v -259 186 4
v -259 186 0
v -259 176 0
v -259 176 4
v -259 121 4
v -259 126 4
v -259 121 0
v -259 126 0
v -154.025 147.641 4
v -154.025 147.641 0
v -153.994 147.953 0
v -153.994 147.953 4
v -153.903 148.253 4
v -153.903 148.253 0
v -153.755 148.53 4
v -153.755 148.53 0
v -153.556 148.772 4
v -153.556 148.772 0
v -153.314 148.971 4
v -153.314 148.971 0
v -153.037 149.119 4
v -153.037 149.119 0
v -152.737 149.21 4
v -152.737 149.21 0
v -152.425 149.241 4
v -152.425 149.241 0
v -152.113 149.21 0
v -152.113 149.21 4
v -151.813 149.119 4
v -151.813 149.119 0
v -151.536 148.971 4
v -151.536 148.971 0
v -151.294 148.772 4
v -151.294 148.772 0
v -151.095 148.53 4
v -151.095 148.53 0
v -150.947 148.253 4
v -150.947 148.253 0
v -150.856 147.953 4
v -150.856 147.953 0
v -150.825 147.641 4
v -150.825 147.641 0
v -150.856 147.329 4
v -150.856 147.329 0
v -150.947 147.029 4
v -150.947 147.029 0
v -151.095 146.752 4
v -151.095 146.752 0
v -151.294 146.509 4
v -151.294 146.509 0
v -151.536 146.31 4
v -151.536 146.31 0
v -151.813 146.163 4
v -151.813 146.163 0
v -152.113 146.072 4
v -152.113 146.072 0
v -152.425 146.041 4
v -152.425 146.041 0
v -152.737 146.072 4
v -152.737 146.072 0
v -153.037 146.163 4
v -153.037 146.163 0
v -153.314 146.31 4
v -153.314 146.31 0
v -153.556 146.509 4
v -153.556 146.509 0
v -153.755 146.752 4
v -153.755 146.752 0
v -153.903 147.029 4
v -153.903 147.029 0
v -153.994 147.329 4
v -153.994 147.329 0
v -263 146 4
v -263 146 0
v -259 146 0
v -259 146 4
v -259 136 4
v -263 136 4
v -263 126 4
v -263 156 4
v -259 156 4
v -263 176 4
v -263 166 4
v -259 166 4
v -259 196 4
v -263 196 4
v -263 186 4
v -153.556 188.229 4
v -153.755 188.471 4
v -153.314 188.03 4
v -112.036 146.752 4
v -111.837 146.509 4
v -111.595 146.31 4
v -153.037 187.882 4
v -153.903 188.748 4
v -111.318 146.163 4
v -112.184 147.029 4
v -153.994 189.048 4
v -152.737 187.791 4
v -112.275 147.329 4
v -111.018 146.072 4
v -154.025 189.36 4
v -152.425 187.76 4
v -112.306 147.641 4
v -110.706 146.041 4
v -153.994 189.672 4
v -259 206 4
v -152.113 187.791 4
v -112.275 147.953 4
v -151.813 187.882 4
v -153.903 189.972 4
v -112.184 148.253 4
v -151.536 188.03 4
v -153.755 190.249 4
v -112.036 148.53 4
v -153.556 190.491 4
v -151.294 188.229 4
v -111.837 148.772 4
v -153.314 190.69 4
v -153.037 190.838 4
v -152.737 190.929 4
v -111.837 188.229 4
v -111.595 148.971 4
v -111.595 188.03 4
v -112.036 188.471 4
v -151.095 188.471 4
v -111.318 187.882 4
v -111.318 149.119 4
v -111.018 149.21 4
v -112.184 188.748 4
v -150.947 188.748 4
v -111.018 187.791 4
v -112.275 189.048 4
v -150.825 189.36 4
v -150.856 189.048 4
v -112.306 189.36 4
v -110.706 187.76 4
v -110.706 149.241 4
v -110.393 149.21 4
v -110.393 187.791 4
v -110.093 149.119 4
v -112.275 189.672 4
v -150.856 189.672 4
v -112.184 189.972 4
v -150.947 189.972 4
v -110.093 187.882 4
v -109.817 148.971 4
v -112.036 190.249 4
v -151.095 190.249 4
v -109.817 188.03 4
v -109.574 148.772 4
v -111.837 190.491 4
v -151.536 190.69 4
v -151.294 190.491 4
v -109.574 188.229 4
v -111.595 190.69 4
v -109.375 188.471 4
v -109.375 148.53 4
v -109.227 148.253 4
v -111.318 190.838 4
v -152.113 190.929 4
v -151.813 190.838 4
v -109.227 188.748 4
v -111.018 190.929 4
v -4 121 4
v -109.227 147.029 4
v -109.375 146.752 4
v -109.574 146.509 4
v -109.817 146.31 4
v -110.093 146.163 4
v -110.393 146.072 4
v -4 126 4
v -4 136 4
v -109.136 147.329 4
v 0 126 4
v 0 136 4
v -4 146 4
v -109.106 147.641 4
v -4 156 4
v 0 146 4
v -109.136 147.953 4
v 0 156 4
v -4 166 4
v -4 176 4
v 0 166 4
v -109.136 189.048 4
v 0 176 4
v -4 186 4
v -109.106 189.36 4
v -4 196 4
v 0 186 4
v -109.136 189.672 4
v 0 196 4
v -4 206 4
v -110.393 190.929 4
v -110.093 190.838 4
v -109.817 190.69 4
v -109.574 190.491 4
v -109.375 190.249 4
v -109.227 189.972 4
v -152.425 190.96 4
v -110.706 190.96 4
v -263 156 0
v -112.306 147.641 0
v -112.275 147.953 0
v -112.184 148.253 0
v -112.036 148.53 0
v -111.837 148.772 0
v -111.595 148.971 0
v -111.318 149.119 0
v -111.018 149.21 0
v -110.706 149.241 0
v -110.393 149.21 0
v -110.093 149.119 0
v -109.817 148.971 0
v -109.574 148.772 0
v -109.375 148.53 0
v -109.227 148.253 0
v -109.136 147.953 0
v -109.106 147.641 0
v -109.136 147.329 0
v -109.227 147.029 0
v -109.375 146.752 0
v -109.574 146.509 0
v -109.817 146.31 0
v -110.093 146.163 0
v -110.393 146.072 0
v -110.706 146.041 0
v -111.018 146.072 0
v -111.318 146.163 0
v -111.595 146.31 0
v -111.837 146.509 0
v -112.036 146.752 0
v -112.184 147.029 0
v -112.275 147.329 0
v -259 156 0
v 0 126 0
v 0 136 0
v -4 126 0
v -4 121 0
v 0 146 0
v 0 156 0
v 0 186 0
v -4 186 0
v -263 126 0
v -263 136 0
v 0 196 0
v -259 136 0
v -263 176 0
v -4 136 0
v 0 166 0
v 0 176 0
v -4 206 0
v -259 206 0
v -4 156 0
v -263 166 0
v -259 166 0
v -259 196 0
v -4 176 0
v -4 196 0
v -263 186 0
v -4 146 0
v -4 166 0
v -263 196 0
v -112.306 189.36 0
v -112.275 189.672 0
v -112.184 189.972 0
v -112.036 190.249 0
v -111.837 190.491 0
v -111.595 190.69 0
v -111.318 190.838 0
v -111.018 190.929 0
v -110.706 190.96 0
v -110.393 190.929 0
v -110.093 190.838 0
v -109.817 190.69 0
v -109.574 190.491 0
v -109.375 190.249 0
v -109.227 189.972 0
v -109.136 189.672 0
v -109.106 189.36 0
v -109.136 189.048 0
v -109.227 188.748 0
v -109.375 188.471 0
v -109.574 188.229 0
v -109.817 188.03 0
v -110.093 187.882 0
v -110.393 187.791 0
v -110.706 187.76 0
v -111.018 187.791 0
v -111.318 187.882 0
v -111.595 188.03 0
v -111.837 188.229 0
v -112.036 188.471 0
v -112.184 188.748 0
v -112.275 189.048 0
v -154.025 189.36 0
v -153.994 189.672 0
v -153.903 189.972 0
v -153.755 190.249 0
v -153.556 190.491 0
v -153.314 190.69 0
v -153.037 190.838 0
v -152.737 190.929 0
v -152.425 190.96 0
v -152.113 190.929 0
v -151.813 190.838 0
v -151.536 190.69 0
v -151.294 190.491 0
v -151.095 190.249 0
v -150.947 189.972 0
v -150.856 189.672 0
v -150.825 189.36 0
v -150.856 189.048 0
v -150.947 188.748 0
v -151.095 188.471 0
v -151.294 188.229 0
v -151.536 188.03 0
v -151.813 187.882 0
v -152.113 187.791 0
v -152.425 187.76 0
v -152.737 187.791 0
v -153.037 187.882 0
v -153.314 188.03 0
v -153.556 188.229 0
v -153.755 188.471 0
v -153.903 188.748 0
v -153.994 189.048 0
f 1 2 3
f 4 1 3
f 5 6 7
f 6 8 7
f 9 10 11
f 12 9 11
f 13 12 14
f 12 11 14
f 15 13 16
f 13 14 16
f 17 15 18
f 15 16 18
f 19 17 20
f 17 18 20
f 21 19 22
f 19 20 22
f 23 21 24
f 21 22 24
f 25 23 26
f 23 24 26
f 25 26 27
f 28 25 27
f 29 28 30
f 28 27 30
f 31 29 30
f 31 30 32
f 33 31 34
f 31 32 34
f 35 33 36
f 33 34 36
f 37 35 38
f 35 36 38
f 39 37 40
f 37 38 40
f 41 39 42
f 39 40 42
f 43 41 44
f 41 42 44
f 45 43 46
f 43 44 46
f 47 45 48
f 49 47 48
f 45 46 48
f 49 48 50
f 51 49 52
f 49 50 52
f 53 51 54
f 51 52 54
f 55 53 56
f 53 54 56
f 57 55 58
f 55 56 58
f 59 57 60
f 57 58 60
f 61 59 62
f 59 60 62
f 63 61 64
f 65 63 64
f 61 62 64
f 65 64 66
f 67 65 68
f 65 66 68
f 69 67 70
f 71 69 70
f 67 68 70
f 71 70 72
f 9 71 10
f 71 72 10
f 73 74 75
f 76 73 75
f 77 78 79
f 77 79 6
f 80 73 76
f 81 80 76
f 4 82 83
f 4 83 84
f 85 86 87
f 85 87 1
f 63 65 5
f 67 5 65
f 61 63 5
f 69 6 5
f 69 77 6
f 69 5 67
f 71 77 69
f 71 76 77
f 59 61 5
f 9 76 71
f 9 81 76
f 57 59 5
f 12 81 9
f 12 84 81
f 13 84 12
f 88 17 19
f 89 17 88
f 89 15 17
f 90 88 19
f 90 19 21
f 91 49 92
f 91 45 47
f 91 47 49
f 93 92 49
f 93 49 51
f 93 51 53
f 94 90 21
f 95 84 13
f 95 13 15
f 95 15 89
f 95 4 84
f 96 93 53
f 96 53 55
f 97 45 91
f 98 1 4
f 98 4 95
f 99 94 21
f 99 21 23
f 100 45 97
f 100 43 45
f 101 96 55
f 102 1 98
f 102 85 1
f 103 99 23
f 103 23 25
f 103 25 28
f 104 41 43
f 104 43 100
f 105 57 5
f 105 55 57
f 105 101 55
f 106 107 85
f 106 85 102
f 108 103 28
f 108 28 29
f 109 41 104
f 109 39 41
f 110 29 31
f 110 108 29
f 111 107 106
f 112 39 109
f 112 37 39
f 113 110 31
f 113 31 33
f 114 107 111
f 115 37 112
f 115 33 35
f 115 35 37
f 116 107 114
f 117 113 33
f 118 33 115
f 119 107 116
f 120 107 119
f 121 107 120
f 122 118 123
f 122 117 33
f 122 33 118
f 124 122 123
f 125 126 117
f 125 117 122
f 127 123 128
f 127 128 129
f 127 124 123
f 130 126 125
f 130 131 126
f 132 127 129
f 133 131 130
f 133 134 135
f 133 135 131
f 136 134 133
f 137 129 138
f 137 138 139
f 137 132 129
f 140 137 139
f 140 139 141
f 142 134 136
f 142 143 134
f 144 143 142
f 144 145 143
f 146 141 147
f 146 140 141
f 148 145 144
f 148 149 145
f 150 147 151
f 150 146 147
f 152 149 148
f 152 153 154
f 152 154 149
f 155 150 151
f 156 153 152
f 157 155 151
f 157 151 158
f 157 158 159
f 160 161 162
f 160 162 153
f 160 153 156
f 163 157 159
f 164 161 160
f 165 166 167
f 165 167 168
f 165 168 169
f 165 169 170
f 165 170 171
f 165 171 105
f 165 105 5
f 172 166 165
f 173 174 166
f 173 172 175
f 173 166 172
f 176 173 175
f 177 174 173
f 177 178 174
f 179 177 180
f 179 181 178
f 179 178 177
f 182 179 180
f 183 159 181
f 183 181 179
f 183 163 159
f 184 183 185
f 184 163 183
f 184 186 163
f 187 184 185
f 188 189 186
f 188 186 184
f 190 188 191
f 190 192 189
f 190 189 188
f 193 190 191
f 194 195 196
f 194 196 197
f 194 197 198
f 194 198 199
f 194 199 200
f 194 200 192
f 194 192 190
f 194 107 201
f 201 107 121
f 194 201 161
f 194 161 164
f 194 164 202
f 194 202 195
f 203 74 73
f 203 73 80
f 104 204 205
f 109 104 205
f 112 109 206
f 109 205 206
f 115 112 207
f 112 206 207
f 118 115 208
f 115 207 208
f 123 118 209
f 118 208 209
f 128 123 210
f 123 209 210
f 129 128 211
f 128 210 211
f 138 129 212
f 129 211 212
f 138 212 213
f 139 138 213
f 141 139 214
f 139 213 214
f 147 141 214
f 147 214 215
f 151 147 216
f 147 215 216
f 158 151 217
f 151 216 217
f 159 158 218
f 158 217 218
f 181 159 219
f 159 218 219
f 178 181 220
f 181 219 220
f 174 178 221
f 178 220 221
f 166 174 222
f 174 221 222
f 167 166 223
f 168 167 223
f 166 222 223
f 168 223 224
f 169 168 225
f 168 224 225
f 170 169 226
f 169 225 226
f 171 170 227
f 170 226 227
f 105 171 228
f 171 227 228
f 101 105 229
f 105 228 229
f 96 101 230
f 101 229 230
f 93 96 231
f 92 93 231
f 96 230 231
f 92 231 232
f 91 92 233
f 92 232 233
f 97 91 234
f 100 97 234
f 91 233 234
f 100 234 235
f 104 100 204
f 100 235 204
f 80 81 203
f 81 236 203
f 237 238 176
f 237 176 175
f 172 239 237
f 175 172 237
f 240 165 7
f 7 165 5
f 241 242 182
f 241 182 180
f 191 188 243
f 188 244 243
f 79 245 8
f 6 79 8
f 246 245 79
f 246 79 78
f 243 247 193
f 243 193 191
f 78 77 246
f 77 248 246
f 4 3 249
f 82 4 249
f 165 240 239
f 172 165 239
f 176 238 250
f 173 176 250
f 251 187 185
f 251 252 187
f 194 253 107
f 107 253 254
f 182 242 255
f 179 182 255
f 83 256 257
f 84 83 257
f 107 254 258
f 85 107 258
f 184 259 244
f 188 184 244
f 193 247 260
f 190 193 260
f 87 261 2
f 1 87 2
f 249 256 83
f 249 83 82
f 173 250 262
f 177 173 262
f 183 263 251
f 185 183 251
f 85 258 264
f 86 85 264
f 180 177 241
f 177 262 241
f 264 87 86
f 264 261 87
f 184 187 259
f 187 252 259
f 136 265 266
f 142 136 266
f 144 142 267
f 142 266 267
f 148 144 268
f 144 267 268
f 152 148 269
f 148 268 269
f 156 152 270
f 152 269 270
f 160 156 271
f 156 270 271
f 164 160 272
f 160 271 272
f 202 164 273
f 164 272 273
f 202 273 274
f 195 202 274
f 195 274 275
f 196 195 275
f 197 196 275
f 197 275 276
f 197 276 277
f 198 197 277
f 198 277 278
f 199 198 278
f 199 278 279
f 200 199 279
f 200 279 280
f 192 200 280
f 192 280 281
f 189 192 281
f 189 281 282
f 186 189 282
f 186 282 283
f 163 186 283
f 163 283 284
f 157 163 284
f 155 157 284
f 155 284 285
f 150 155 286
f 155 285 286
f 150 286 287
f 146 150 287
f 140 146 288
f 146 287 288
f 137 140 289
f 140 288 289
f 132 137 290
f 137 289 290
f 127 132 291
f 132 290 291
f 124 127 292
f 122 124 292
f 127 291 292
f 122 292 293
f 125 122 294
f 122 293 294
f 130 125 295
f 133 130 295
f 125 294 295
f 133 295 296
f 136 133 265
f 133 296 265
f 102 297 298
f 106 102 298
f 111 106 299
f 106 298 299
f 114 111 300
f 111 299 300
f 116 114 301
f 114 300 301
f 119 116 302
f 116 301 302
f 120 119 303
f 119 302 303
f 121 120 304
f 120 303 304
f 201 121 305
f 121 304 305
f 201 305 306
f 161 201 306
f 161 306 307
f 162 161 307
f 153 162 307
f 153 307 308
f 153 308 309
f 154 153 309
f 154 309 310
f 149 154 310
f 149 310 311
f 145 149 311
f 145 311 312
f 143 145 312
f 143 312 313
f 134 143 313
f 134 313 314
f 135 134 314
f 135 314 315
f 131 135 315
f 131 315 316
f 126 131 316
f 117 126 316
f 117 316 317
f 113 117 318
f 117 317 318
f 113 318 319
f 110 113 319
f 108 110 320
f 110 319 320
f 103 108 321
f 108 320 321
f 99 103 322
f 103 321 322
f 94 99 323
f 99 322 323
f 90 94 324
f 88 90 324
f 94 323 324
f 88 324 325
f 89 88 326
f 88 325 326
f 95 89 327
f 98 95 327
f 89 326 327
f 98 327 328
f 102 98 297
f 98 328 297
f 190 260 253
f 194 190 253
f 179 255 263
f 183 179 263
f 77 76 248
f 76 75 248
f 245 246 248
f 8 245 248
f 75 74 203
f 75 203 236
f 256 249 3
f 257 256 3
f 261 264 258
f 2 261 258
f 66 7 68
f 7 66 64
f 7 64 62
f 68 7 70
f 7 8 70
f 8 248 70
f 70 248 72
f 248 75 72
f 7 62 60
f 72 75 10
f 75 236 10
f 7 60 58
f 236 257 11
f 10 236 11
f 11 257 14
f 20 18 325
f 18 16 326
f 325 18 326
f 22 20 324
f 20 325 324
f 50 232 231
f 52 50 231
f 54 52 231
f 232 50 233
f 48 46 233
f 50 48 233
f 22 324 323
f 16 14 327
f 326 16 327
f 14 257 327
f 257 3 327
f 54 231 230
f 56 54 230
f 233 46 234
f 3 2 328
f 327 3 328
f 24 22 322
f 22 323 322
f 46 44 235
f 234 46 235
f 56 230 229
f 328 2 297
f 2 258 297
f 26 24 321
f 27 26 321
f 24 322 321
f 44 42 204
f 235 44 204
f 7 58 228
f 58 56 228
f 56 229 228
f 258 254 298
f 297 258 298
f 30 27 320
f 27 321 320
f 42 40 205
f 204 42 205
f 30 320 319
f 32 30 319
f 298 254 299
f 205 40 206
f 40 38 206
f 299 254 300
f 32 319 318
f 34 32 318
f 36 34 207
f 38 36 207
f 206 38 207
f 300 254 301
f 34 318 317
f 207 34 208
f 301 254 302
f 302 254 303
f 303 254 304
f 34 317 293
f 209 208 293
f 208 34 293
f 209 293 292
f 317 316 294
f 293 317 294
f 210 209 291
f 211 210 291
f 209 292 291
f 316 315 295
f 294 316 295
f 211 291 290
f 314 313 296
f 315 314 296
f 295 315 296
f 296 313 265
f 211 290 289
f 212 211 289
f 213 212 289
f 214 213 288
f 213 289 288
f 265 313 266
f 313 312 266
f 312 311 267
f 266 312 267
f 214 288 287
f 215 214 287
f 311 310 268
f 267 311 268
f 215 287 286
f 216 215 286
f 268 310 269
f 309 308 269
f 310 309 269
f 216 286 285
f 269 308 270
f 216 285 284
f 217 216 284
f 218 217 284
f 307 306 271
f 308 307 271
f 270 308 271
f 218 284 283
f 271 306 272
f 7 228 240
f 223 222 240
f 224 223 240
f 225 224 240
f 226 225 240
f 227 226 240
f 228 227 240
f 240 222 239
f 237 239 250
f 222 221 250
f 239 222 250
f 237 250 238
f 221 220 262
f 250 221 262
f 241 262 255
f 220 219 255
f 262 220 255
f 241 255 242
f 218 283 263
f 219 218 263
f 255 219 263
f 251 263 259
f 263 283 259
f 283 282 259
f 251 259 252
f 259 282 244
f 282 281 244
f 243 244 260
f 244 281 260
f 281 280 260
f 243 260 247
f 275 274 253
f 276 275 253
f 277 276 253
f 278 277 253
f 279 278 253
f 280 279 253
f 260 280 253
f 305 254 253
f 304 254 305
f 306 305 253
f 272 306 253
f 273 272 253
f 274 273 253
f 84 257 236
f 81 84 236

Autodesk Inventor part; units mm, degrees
ref_plane "YZ Plane" through (0, 0, 0) normal (1, 0, 0) x (0, 1, 0)
ref_plane "XZ Plane" through (0, 0, 0) normal (0, 1, 0) x (-1, 0, 0)
ref_plane "XY Plane" through (0, 0, 0) normal (0, 0, 1) x (1, 0, 0)
sketch "Эскиз1" plane through (0, 0, 0) normal (0, 0, 1) x (1, 0, 0)
  line L0 (0, 16.0005) -> (-4, 16.0005) projected
  line L1 (-4, 6.0005) -> (-4, 16.0005) projected
  line L2 (-4, 6.0005) -> (0, 6.0005) projected
  line L3 (0, 16.0005) -> (0, 6.0005) projected
  line L4 (0, 36.0005) -> (-4, 36.0005) projected
  line L5 (-4, 26.0005) -> (-4, 36.0005) projected
  line L6 (-4, 26.0005) -> (0, 26.0005) projected
  line L7 (0, 36.0005) -> (0, 26.0005) projected
  line L8 (0, 56.0005) -> (-4, 56.0005) projected
  line L9 (-4, 46.0005) -> (-4, 56.0005) projected
  line L10 (-4, 46.0005) -> (0, 46.0005) projected
  line L11 (0, 56.0005) -> (0, 46.0005) projected
  line L12 (0, 196.0005) -> (-4, 196.0005) projected
  line L13 (-4, 186.0005) -> (-4, 196.0005) projected
  line L14 (-4, 186.0005) -> (0, 186.0005) projected
  line L15 (0, 196.0005) -> (0, 186.0005) projected
  line L16 (0, 176.0005) -> (-4, 176.0005) projected
  line L17 (-4, 166.0005) -> (-4, 176.0005) projected
  line L18 (-4, 166.0005) -> (0, 166.0005) projected
  line L19 (0, 176.0005) -> (0, 166.0005) projected
  line L20 (0, 156.0005) -> (-4, 156.0005) projected
  line L21 (-4, 146.0005) -> (-4, 156.0005) projected
  line L22 (-4, 146.0005) -> (0, 146.0005) projected
  line L23 (0, 156.0005) -> (0, 146.0005) projected
  line L24 (0, 116.0005) -> (-4, 116.0005) projected
  line L25 (-4, 106.0005) -> (-4, 116.0005) projected
  line L26 (-4, 106.0005) -> (0, 106.0005) projected
  line L27 (0, 116.0005) -> (0, 106.0005) projected
  line L28 (0, 136.0005) -> (-4, 136.0005) projected
  line L29 (-4, 126.0005) -> (-4, 136.0005) projected
  line L30 (-4, 126.0005) -> (0, 126.0005) projected
  line L31 (0, 136.0005) -> (0, 126.0005) projected
  line L32 (0, 96.0005) -> (-4, 96.0005) projected
  line L33 (-4, 86.0005) -> (-4, 96.0005) projected
  line L34 (-4, 86.0005) -> (0, 86.0005) projected
  line L35 (0, 96.0005) -> (0, 86.0005) projected
  line L36 (0, 76.0005) -> (-4, 76.0005) projected
  line L37 (-4, 66.0005) -> (-4, 76.0005) projected
  line L38 (-4, 66.0005) -> (0, 66.0005) projected
  line L39 (0, 76.0005) -> (0, 66.0005) projected
  line L40 (-194, 0) -> (-194, -4) projected
  line L41 (-189, -4) -> (-194, -4) projected
  line L42 (-189, -4) -> (-189, 0) projected
  line L43 (-194, 0) -> (-189, 0) projected
  line L44 (-184, 0) -> (-184, -4) projected
  line L45 (-179, -4) -> (-184, -4) projected
  line L46 (-179, -4) -> (-179, 0) projected
  line L47 (-184, 0) -> (-179, 0) projected
  line L48 (-174, 0) -> (-174, -4) projected
  line L49 (-169, -4) -> (-174, -4) projected
  line L50 (-169, -4) -> (-169, 0) projected
  line L51 (-174, 0) -> (-169, 0) projected
  line L52 (-164, 0) -> (-164, -4) projected
  line L53 (-159, -4) -> (-164, -4) projected
  line L54 (-159, -4) -> (-159, 0) projected
  line L55 (-164, 0) -> (-159, 0) projected
  line L56 (-154, 0) -> (-154, -4) projected
  line L57 (-149, -4) -> (-154, -4) projected
  line L58 (-149, -4) -> (-149, 0) projected
  line L59 (-154, 0) -> (-149, 0) projected
  line L60 (-144, 0) -> (-144, -4) projected
  line L61 (-139, -4) -> (-144, -4) projected
  line L62 (-139, -4) -> (-139, 0) projected
  line L63 (-144, 0) -> (-139, 0) projected
  line L64 (-14, 0) -> (-14, -4) projected
  line L65 (-9, -4) -> (-14, -4) projected
  line L66 (-9, -4) -> (-9, 0) projected
  line L67 (-14, 0) -> (-9, 0) projected
  line L68 (-24, 0) -> (-24, -4) projected
  line L69 (-19, -4) -> (-24, -4) projected
  line L70 (-19, -4) -> (-19, 0) projected
  line L71 (-24, 0) -> (-19, 0) projected
  line L72 (-95.712, 271.7663) -> (-95.712, 277.9752) projected
  line L73 (-34, 0) -> (-34, -4) projected
  line L74 (-29, -4) -> (-34, -4) projected
  line L75 (-29, -4) -> (-29, 0) projected
  line L76 (-34, 0) -> (-29, 0) projected
  line L77 (-44, 0) -> (-44, -4) projected
  line L78 (-39, -4) -> (-44, -4) projected
  line L79 (-39, -4) -> (-39, 0) projected
  line L80 (-44, 0) -> (-39, 0) projected
  line L81 (-54, 0) -> (-54, -4) projected
  line L82 (-49, -4) -> (-54, -4) projected
  line L83 (-49, -4) -> (-49, 0) projected
  line L84 (-54, 0) -> (-49, 0) projected
  line L85 (-64, 0) -> (-64, -4) projected
  line L86 (-59, -4) -> (-64, -4) projected
  line L87 (-59, -4) -> (-59, 0) projected
  line L88 (-64, 0) -> (-59, 0) projected
  line L89 (-74, 0) -> (-74, -4) projected
  line L90 (-69, -4) -> (-74, -4) projected
  line L91 (-69, -4) -> (-69, 0) projected
  line L92 (-74, 0) -> (-69, 0) projected
  line L93 (-84, 0) -> (-84, -4) projected
  line L94 (-79, -4) -> (-84, -4) projected
  line L95 (-79, -4) -> (-79, 0) projected
  line L96 (-84, 0) -> (-79, 0) projected
  line L97 (-94, 0) -> (-94, -4) projected
  line L98 (-89, -4) -> (-94, -4) projected
  line L99 (-89, -4) -> (-89, 0) projected
  line L100 (-94, 0) -> (-89, 0) projected
  line L101 (-104, 0) -> (-104, -4) projected
  line L102 (-99, -4) -> (-104, -4) projected
  line L103 (-99, -4) -> (-99, 0) projected
  line L104 (-104, 0) -> (-99, 0) projected
  line L105 (-114, 0) -> (-114, -4) projected
  line L106 (-109, -4) -> (-114, -4) projected
  line L107 (-109, -4) -> (-109, 0) projected
  line L108 (-114, 0) -> (-109, 0) projected
  line L109 (-134, 0) -> (-134, -4) projected
  line L110 (-129, -4) -> (-134, -4) projected
  line L111 (-129, -4) -> (-129, 0) projected
  line L112 (-134, 0) -> (-129, 0) projected
  line L113 (-124, 0) -> (-124, -4) projected
  line L114 (-119, -4) -> (-124, -4) projected
  line L115 (-119, -4) -> (-119, 0) projected
  line L116 (-124, 0) -> (-119, 0) projected
  line L117 (-263, 126.0005) -> (-263, 136.0005) projected
  line L118 (-259, 136.0005) -> (-259, 126.0005) projected
  line L119 (-263, 126.0005) -> (-263, 136.0005) projected
  line L120 (-259, 136.0005) -> (-259, 126.0005) projected
  line L121 (-263, 126.0005) -> (-263, 136.0005) projected
  line L122 (-259, 136.0005) -> (-259, 126.0005) projected
  line L123 (-263, 126.0005) -> (-263, 136.0005) projected
  line L124 (-259, 136.0005) -> (-259, 126.0005) projected
  line L125 (-263, 126.0005) -> (-263, 136.0005) projected
  line L126 (-259, 136.0005) -> (-259, 126.0005) projected
  line L127 (-263, 126.0005) -> (-263, 136.0005) projected
  line L128 (-259, 136.0005) -> (-259, 126.0005) projected
  line L129 (-259, 136.0005) -> (-263, 136.0005) projected
  line L130 (-263, 126.0005) -> (-263, 136.0005) projected
  line L131 (-263, 126.0005) -> (-259, 126.0005) projected
  line L132 (-259, 136.0005) -> (-259, 126.0005) projected
  line L133 (-259, 156.0005) -> (-259, 146.0005) projected
  line L134 (-259, 156.0005) -> (-263, 156.0005) projected
  line L135 (-263, 146.0005) -> (-263, 156.0005) projected
  line L136 (-263, 146.0005) -> (-259, 146.0005) projected
  line L137 (-259, 156.0005) -> (-259, 146.0005) projected
  line L138 (-259, 176.0005) -> (-263, 176.0005) projected
  line L139 (-263, 166.0005) -> (-263, 176.0005) projected
  line L140 (-263, 166.0005) -> (-259, 166.0005) projected
  line L141 (-259, 176.0005) -> (-259, 166.0005) projected
  line L142 (-259, 196.0005) -> (-259, 186.0005) projected
  line L143 (-259, 196.0005) -> (-263, 196.0005) projected
  line L144 (-263, 186.0005) -> (-263, 196.0005) projected
  line L145 (-263, 186.0005) -> (-259, 186.0005) projected
  line L146 (-259, 196.0005) -> (-259, 186.0005) projected
  line L147 (-4, 196.0005) -> (-4, 206.0005) projected
  line L148 (-4, 196.0005) -> (0, 196.0005) projected
  line L149 (0, 206.0005) -> (0, 196.0005) projected
  line L150 (-4, 206.0005) -> (0, 206.0005) projected
  line L151 (-263, 196.0005) -> (-263, 206.0005) projected
  line L152 (-259, 206.0005) -> (-259, 196.0005) projected
  line L153 (-4, 206.0005) -> (-259, 206.0005)
  line L154 (-259, 206.0005) -> (-259, 0)
  line L155 (-259, 0) -> (-4, 0)
  line L156 (-4, 0) -> (-4, 206.0005)
  line L157 (-204, 0) -> (-204, -4) projected
  line L158 (-199, -4) -> (-204, -4) projected
  line L159 (-199, -4) -> (-199, 0) projected
  line L160 (-204, 0) -> (-199, 0) projected
  line L161 (-214, 0) -> (-214, -4) projected
  line L162 (-209, -4) -> (-214, -4) projected
  line L163 (-209, -4) -> (-209, 0) projected
  line L164 (-214, 0) -> (-209, 0) projected
  line L165 (-224, 0) -> (-224, -4) projected
  line L166 (-219, -4) -> (-224, -4) projected
  line L167 (-219, -4) -> (-219, 0) projected
  line L168 (-224, 0) -> (-219, 0) projected
  line L169 (-234, 0) -> (-234, -4) projected
  line L170 (-229, -4) -> (-234, -4) projected
  line L171 (-229, -4) -> (-229, 0) projected
  line L172 (-234, 0) -> (-229, 0) projected
  line L173 (-244, 0) -> (-244, -4) projected
  line L174 (-239, -4) -> (-244, -4) projected
  line L175 (-239, -4) -> (-239, 0) projected
  line L176 (-244, 0) -> (-239, 0) projected
  line L177 (-253.5, 0) -> (-253.5, -4)
  line L178 (-254, 0) -> (-254, -4) projected
  line L179 (-249, -4) -> (-254, -4) projected
  line L180 (-249, -4) -> (-249, 0) projected
  line L181 (-254, 0) -> (-249, 0) projected
  line L182 (-259, 136.0005) -> (-263, 136.0005) projected
  line L183 (-263, 126.0005) -> (-259, 126.0005) projected
  line L184 (-259, 136.0005) -> (-263, 136.0005) projected
  line L185 (-263, 126.0005) -> (-259, 126.0005) projected
  line L186 (-259, 136.0005) -> (-263, 136.0005) projected
  line L187 (-263, 126.0005) -> (-259, 126.0005) projected
  line L188 (-259, 136.0005) -> (-263, 136.0005) projected
  line L189 (-263, 126.0005) -> (-259, 126.0005) projected
  line L190 (-259, 136.0005) -> (-263, 136.0005) projected
  line L191 (-263, 126.0005) -> (-259, 126.0005) projected
  line L192 (-259, 136.0005) -> (-263, 136.0005) projected
  line L193 (-263, 126.0005) -> (-259, 126.0005) projected
  point P0 (0, 0)
  point P1 (-199, 206.0005)
  point P2 (-259, 176.0005)
  point P3 (-259, 156.0005)
  point P4 (-259, 146.0005)
extrude "Выдавливание1" add sketch "Эскиз1" along normal blind 4 contours L3 L2 L1 L0 | L1 L156 L155 L67 L71 L76 L80 L84 L88 L92 L96 L100 L104 L108 L116 L112 L63 L59 L55 L51 L47 L43 L154 L118 L133 L141 L142 L152 L153 L147 L13 L17 L21 L29 L25 L33 L37 L9 L5 | L5 L4 L7 L6 | L66 L65 L64 L67 | L9 L8 L11 L10 | L70 L69 L68 L71 | L37 L36 L39 L38 | L75 L74 L73 L76 | L33 L32 L35 L34 | L79 L78 L77 L80 | L25 L24 L27 L26 | L83 L82 L81 L84 | L29 L28 L31 L30 | L87 L86 L85 L88 | L21 L20 L23 L22 | L91 L90 L89 L92 | L17 L16 L19 L18 | L95 L94 L93 L96 | L13 L12 L15 L14 | L99 L98 L97 L100 | L103 L102 L101 L104 | L142 L145 L144 L143 | L107 L106 L105 L108 | L141 L140 L139 L138 | L115 L114 L113 L116 | L133 L136 L135 L134 | L111 L110 L109 L112 | L118 L131 L117 L129 | L62 L61 L60 L63 | L155 L177 L179 L178 | L58 L57 L56 L59 | L155 L180 L179 L177 | L54 L53 L52 L55 | L155 L175 L174 L173 | L50 L49 L48 L51 | L155 L171 L170 L169 | L46 L45 L44 L47 | L155 L167 L166 L165 | L42 L41 L40 L43 | L155 L163 L162 L161 | L159 L158 L157 L155
sketch "Эскиз2" plane through (0, 0, 4) normal (0, 0, 1) x (1, 0, 0)
  line L0 (-254, -4) -> (-249, -4) projected
  line L1 (-254, -4) -> (-263, -4)
  line L2 (-263, 16.0005) -> (-263, 6.0005) projected
  line L3 (-263, -4) -> (-263, 6.0005)
  line L4 (-263, -4) -> (0, -4)
  line L5 (0, -4) -> (0, 121)
  line L6 (0, 121) -> (-263, 121)
  line L7 (-263, 121) -> (-263, -4)
  point P0 (0, 0)
  dimension "d2" = 125
extrude "Выдавливание2" cut sketch "Эскиз2" against normal blind 10
sketch "Эскиз3" plane through (0, 0, 0) normal (0, 0, -1) x (-1, 0, 0)
  circle A0 centre (110.7056, 189.3601) radius 1.6 projected
  circle A1 centre (152.4249, 189.3601) radius 1.6 projected
  circle A2 centre (152.4249, 147.6408) radius 1.6 projected
  circle A3 centre (110.7056, 147.6408) radius 1.6 projected
  point P0 (0, 0)
extrude "Выдавливание3" cut sketch "Эскиз3" against normal blind 10
properties part number "KB33-046-004-016 - Крышка"
